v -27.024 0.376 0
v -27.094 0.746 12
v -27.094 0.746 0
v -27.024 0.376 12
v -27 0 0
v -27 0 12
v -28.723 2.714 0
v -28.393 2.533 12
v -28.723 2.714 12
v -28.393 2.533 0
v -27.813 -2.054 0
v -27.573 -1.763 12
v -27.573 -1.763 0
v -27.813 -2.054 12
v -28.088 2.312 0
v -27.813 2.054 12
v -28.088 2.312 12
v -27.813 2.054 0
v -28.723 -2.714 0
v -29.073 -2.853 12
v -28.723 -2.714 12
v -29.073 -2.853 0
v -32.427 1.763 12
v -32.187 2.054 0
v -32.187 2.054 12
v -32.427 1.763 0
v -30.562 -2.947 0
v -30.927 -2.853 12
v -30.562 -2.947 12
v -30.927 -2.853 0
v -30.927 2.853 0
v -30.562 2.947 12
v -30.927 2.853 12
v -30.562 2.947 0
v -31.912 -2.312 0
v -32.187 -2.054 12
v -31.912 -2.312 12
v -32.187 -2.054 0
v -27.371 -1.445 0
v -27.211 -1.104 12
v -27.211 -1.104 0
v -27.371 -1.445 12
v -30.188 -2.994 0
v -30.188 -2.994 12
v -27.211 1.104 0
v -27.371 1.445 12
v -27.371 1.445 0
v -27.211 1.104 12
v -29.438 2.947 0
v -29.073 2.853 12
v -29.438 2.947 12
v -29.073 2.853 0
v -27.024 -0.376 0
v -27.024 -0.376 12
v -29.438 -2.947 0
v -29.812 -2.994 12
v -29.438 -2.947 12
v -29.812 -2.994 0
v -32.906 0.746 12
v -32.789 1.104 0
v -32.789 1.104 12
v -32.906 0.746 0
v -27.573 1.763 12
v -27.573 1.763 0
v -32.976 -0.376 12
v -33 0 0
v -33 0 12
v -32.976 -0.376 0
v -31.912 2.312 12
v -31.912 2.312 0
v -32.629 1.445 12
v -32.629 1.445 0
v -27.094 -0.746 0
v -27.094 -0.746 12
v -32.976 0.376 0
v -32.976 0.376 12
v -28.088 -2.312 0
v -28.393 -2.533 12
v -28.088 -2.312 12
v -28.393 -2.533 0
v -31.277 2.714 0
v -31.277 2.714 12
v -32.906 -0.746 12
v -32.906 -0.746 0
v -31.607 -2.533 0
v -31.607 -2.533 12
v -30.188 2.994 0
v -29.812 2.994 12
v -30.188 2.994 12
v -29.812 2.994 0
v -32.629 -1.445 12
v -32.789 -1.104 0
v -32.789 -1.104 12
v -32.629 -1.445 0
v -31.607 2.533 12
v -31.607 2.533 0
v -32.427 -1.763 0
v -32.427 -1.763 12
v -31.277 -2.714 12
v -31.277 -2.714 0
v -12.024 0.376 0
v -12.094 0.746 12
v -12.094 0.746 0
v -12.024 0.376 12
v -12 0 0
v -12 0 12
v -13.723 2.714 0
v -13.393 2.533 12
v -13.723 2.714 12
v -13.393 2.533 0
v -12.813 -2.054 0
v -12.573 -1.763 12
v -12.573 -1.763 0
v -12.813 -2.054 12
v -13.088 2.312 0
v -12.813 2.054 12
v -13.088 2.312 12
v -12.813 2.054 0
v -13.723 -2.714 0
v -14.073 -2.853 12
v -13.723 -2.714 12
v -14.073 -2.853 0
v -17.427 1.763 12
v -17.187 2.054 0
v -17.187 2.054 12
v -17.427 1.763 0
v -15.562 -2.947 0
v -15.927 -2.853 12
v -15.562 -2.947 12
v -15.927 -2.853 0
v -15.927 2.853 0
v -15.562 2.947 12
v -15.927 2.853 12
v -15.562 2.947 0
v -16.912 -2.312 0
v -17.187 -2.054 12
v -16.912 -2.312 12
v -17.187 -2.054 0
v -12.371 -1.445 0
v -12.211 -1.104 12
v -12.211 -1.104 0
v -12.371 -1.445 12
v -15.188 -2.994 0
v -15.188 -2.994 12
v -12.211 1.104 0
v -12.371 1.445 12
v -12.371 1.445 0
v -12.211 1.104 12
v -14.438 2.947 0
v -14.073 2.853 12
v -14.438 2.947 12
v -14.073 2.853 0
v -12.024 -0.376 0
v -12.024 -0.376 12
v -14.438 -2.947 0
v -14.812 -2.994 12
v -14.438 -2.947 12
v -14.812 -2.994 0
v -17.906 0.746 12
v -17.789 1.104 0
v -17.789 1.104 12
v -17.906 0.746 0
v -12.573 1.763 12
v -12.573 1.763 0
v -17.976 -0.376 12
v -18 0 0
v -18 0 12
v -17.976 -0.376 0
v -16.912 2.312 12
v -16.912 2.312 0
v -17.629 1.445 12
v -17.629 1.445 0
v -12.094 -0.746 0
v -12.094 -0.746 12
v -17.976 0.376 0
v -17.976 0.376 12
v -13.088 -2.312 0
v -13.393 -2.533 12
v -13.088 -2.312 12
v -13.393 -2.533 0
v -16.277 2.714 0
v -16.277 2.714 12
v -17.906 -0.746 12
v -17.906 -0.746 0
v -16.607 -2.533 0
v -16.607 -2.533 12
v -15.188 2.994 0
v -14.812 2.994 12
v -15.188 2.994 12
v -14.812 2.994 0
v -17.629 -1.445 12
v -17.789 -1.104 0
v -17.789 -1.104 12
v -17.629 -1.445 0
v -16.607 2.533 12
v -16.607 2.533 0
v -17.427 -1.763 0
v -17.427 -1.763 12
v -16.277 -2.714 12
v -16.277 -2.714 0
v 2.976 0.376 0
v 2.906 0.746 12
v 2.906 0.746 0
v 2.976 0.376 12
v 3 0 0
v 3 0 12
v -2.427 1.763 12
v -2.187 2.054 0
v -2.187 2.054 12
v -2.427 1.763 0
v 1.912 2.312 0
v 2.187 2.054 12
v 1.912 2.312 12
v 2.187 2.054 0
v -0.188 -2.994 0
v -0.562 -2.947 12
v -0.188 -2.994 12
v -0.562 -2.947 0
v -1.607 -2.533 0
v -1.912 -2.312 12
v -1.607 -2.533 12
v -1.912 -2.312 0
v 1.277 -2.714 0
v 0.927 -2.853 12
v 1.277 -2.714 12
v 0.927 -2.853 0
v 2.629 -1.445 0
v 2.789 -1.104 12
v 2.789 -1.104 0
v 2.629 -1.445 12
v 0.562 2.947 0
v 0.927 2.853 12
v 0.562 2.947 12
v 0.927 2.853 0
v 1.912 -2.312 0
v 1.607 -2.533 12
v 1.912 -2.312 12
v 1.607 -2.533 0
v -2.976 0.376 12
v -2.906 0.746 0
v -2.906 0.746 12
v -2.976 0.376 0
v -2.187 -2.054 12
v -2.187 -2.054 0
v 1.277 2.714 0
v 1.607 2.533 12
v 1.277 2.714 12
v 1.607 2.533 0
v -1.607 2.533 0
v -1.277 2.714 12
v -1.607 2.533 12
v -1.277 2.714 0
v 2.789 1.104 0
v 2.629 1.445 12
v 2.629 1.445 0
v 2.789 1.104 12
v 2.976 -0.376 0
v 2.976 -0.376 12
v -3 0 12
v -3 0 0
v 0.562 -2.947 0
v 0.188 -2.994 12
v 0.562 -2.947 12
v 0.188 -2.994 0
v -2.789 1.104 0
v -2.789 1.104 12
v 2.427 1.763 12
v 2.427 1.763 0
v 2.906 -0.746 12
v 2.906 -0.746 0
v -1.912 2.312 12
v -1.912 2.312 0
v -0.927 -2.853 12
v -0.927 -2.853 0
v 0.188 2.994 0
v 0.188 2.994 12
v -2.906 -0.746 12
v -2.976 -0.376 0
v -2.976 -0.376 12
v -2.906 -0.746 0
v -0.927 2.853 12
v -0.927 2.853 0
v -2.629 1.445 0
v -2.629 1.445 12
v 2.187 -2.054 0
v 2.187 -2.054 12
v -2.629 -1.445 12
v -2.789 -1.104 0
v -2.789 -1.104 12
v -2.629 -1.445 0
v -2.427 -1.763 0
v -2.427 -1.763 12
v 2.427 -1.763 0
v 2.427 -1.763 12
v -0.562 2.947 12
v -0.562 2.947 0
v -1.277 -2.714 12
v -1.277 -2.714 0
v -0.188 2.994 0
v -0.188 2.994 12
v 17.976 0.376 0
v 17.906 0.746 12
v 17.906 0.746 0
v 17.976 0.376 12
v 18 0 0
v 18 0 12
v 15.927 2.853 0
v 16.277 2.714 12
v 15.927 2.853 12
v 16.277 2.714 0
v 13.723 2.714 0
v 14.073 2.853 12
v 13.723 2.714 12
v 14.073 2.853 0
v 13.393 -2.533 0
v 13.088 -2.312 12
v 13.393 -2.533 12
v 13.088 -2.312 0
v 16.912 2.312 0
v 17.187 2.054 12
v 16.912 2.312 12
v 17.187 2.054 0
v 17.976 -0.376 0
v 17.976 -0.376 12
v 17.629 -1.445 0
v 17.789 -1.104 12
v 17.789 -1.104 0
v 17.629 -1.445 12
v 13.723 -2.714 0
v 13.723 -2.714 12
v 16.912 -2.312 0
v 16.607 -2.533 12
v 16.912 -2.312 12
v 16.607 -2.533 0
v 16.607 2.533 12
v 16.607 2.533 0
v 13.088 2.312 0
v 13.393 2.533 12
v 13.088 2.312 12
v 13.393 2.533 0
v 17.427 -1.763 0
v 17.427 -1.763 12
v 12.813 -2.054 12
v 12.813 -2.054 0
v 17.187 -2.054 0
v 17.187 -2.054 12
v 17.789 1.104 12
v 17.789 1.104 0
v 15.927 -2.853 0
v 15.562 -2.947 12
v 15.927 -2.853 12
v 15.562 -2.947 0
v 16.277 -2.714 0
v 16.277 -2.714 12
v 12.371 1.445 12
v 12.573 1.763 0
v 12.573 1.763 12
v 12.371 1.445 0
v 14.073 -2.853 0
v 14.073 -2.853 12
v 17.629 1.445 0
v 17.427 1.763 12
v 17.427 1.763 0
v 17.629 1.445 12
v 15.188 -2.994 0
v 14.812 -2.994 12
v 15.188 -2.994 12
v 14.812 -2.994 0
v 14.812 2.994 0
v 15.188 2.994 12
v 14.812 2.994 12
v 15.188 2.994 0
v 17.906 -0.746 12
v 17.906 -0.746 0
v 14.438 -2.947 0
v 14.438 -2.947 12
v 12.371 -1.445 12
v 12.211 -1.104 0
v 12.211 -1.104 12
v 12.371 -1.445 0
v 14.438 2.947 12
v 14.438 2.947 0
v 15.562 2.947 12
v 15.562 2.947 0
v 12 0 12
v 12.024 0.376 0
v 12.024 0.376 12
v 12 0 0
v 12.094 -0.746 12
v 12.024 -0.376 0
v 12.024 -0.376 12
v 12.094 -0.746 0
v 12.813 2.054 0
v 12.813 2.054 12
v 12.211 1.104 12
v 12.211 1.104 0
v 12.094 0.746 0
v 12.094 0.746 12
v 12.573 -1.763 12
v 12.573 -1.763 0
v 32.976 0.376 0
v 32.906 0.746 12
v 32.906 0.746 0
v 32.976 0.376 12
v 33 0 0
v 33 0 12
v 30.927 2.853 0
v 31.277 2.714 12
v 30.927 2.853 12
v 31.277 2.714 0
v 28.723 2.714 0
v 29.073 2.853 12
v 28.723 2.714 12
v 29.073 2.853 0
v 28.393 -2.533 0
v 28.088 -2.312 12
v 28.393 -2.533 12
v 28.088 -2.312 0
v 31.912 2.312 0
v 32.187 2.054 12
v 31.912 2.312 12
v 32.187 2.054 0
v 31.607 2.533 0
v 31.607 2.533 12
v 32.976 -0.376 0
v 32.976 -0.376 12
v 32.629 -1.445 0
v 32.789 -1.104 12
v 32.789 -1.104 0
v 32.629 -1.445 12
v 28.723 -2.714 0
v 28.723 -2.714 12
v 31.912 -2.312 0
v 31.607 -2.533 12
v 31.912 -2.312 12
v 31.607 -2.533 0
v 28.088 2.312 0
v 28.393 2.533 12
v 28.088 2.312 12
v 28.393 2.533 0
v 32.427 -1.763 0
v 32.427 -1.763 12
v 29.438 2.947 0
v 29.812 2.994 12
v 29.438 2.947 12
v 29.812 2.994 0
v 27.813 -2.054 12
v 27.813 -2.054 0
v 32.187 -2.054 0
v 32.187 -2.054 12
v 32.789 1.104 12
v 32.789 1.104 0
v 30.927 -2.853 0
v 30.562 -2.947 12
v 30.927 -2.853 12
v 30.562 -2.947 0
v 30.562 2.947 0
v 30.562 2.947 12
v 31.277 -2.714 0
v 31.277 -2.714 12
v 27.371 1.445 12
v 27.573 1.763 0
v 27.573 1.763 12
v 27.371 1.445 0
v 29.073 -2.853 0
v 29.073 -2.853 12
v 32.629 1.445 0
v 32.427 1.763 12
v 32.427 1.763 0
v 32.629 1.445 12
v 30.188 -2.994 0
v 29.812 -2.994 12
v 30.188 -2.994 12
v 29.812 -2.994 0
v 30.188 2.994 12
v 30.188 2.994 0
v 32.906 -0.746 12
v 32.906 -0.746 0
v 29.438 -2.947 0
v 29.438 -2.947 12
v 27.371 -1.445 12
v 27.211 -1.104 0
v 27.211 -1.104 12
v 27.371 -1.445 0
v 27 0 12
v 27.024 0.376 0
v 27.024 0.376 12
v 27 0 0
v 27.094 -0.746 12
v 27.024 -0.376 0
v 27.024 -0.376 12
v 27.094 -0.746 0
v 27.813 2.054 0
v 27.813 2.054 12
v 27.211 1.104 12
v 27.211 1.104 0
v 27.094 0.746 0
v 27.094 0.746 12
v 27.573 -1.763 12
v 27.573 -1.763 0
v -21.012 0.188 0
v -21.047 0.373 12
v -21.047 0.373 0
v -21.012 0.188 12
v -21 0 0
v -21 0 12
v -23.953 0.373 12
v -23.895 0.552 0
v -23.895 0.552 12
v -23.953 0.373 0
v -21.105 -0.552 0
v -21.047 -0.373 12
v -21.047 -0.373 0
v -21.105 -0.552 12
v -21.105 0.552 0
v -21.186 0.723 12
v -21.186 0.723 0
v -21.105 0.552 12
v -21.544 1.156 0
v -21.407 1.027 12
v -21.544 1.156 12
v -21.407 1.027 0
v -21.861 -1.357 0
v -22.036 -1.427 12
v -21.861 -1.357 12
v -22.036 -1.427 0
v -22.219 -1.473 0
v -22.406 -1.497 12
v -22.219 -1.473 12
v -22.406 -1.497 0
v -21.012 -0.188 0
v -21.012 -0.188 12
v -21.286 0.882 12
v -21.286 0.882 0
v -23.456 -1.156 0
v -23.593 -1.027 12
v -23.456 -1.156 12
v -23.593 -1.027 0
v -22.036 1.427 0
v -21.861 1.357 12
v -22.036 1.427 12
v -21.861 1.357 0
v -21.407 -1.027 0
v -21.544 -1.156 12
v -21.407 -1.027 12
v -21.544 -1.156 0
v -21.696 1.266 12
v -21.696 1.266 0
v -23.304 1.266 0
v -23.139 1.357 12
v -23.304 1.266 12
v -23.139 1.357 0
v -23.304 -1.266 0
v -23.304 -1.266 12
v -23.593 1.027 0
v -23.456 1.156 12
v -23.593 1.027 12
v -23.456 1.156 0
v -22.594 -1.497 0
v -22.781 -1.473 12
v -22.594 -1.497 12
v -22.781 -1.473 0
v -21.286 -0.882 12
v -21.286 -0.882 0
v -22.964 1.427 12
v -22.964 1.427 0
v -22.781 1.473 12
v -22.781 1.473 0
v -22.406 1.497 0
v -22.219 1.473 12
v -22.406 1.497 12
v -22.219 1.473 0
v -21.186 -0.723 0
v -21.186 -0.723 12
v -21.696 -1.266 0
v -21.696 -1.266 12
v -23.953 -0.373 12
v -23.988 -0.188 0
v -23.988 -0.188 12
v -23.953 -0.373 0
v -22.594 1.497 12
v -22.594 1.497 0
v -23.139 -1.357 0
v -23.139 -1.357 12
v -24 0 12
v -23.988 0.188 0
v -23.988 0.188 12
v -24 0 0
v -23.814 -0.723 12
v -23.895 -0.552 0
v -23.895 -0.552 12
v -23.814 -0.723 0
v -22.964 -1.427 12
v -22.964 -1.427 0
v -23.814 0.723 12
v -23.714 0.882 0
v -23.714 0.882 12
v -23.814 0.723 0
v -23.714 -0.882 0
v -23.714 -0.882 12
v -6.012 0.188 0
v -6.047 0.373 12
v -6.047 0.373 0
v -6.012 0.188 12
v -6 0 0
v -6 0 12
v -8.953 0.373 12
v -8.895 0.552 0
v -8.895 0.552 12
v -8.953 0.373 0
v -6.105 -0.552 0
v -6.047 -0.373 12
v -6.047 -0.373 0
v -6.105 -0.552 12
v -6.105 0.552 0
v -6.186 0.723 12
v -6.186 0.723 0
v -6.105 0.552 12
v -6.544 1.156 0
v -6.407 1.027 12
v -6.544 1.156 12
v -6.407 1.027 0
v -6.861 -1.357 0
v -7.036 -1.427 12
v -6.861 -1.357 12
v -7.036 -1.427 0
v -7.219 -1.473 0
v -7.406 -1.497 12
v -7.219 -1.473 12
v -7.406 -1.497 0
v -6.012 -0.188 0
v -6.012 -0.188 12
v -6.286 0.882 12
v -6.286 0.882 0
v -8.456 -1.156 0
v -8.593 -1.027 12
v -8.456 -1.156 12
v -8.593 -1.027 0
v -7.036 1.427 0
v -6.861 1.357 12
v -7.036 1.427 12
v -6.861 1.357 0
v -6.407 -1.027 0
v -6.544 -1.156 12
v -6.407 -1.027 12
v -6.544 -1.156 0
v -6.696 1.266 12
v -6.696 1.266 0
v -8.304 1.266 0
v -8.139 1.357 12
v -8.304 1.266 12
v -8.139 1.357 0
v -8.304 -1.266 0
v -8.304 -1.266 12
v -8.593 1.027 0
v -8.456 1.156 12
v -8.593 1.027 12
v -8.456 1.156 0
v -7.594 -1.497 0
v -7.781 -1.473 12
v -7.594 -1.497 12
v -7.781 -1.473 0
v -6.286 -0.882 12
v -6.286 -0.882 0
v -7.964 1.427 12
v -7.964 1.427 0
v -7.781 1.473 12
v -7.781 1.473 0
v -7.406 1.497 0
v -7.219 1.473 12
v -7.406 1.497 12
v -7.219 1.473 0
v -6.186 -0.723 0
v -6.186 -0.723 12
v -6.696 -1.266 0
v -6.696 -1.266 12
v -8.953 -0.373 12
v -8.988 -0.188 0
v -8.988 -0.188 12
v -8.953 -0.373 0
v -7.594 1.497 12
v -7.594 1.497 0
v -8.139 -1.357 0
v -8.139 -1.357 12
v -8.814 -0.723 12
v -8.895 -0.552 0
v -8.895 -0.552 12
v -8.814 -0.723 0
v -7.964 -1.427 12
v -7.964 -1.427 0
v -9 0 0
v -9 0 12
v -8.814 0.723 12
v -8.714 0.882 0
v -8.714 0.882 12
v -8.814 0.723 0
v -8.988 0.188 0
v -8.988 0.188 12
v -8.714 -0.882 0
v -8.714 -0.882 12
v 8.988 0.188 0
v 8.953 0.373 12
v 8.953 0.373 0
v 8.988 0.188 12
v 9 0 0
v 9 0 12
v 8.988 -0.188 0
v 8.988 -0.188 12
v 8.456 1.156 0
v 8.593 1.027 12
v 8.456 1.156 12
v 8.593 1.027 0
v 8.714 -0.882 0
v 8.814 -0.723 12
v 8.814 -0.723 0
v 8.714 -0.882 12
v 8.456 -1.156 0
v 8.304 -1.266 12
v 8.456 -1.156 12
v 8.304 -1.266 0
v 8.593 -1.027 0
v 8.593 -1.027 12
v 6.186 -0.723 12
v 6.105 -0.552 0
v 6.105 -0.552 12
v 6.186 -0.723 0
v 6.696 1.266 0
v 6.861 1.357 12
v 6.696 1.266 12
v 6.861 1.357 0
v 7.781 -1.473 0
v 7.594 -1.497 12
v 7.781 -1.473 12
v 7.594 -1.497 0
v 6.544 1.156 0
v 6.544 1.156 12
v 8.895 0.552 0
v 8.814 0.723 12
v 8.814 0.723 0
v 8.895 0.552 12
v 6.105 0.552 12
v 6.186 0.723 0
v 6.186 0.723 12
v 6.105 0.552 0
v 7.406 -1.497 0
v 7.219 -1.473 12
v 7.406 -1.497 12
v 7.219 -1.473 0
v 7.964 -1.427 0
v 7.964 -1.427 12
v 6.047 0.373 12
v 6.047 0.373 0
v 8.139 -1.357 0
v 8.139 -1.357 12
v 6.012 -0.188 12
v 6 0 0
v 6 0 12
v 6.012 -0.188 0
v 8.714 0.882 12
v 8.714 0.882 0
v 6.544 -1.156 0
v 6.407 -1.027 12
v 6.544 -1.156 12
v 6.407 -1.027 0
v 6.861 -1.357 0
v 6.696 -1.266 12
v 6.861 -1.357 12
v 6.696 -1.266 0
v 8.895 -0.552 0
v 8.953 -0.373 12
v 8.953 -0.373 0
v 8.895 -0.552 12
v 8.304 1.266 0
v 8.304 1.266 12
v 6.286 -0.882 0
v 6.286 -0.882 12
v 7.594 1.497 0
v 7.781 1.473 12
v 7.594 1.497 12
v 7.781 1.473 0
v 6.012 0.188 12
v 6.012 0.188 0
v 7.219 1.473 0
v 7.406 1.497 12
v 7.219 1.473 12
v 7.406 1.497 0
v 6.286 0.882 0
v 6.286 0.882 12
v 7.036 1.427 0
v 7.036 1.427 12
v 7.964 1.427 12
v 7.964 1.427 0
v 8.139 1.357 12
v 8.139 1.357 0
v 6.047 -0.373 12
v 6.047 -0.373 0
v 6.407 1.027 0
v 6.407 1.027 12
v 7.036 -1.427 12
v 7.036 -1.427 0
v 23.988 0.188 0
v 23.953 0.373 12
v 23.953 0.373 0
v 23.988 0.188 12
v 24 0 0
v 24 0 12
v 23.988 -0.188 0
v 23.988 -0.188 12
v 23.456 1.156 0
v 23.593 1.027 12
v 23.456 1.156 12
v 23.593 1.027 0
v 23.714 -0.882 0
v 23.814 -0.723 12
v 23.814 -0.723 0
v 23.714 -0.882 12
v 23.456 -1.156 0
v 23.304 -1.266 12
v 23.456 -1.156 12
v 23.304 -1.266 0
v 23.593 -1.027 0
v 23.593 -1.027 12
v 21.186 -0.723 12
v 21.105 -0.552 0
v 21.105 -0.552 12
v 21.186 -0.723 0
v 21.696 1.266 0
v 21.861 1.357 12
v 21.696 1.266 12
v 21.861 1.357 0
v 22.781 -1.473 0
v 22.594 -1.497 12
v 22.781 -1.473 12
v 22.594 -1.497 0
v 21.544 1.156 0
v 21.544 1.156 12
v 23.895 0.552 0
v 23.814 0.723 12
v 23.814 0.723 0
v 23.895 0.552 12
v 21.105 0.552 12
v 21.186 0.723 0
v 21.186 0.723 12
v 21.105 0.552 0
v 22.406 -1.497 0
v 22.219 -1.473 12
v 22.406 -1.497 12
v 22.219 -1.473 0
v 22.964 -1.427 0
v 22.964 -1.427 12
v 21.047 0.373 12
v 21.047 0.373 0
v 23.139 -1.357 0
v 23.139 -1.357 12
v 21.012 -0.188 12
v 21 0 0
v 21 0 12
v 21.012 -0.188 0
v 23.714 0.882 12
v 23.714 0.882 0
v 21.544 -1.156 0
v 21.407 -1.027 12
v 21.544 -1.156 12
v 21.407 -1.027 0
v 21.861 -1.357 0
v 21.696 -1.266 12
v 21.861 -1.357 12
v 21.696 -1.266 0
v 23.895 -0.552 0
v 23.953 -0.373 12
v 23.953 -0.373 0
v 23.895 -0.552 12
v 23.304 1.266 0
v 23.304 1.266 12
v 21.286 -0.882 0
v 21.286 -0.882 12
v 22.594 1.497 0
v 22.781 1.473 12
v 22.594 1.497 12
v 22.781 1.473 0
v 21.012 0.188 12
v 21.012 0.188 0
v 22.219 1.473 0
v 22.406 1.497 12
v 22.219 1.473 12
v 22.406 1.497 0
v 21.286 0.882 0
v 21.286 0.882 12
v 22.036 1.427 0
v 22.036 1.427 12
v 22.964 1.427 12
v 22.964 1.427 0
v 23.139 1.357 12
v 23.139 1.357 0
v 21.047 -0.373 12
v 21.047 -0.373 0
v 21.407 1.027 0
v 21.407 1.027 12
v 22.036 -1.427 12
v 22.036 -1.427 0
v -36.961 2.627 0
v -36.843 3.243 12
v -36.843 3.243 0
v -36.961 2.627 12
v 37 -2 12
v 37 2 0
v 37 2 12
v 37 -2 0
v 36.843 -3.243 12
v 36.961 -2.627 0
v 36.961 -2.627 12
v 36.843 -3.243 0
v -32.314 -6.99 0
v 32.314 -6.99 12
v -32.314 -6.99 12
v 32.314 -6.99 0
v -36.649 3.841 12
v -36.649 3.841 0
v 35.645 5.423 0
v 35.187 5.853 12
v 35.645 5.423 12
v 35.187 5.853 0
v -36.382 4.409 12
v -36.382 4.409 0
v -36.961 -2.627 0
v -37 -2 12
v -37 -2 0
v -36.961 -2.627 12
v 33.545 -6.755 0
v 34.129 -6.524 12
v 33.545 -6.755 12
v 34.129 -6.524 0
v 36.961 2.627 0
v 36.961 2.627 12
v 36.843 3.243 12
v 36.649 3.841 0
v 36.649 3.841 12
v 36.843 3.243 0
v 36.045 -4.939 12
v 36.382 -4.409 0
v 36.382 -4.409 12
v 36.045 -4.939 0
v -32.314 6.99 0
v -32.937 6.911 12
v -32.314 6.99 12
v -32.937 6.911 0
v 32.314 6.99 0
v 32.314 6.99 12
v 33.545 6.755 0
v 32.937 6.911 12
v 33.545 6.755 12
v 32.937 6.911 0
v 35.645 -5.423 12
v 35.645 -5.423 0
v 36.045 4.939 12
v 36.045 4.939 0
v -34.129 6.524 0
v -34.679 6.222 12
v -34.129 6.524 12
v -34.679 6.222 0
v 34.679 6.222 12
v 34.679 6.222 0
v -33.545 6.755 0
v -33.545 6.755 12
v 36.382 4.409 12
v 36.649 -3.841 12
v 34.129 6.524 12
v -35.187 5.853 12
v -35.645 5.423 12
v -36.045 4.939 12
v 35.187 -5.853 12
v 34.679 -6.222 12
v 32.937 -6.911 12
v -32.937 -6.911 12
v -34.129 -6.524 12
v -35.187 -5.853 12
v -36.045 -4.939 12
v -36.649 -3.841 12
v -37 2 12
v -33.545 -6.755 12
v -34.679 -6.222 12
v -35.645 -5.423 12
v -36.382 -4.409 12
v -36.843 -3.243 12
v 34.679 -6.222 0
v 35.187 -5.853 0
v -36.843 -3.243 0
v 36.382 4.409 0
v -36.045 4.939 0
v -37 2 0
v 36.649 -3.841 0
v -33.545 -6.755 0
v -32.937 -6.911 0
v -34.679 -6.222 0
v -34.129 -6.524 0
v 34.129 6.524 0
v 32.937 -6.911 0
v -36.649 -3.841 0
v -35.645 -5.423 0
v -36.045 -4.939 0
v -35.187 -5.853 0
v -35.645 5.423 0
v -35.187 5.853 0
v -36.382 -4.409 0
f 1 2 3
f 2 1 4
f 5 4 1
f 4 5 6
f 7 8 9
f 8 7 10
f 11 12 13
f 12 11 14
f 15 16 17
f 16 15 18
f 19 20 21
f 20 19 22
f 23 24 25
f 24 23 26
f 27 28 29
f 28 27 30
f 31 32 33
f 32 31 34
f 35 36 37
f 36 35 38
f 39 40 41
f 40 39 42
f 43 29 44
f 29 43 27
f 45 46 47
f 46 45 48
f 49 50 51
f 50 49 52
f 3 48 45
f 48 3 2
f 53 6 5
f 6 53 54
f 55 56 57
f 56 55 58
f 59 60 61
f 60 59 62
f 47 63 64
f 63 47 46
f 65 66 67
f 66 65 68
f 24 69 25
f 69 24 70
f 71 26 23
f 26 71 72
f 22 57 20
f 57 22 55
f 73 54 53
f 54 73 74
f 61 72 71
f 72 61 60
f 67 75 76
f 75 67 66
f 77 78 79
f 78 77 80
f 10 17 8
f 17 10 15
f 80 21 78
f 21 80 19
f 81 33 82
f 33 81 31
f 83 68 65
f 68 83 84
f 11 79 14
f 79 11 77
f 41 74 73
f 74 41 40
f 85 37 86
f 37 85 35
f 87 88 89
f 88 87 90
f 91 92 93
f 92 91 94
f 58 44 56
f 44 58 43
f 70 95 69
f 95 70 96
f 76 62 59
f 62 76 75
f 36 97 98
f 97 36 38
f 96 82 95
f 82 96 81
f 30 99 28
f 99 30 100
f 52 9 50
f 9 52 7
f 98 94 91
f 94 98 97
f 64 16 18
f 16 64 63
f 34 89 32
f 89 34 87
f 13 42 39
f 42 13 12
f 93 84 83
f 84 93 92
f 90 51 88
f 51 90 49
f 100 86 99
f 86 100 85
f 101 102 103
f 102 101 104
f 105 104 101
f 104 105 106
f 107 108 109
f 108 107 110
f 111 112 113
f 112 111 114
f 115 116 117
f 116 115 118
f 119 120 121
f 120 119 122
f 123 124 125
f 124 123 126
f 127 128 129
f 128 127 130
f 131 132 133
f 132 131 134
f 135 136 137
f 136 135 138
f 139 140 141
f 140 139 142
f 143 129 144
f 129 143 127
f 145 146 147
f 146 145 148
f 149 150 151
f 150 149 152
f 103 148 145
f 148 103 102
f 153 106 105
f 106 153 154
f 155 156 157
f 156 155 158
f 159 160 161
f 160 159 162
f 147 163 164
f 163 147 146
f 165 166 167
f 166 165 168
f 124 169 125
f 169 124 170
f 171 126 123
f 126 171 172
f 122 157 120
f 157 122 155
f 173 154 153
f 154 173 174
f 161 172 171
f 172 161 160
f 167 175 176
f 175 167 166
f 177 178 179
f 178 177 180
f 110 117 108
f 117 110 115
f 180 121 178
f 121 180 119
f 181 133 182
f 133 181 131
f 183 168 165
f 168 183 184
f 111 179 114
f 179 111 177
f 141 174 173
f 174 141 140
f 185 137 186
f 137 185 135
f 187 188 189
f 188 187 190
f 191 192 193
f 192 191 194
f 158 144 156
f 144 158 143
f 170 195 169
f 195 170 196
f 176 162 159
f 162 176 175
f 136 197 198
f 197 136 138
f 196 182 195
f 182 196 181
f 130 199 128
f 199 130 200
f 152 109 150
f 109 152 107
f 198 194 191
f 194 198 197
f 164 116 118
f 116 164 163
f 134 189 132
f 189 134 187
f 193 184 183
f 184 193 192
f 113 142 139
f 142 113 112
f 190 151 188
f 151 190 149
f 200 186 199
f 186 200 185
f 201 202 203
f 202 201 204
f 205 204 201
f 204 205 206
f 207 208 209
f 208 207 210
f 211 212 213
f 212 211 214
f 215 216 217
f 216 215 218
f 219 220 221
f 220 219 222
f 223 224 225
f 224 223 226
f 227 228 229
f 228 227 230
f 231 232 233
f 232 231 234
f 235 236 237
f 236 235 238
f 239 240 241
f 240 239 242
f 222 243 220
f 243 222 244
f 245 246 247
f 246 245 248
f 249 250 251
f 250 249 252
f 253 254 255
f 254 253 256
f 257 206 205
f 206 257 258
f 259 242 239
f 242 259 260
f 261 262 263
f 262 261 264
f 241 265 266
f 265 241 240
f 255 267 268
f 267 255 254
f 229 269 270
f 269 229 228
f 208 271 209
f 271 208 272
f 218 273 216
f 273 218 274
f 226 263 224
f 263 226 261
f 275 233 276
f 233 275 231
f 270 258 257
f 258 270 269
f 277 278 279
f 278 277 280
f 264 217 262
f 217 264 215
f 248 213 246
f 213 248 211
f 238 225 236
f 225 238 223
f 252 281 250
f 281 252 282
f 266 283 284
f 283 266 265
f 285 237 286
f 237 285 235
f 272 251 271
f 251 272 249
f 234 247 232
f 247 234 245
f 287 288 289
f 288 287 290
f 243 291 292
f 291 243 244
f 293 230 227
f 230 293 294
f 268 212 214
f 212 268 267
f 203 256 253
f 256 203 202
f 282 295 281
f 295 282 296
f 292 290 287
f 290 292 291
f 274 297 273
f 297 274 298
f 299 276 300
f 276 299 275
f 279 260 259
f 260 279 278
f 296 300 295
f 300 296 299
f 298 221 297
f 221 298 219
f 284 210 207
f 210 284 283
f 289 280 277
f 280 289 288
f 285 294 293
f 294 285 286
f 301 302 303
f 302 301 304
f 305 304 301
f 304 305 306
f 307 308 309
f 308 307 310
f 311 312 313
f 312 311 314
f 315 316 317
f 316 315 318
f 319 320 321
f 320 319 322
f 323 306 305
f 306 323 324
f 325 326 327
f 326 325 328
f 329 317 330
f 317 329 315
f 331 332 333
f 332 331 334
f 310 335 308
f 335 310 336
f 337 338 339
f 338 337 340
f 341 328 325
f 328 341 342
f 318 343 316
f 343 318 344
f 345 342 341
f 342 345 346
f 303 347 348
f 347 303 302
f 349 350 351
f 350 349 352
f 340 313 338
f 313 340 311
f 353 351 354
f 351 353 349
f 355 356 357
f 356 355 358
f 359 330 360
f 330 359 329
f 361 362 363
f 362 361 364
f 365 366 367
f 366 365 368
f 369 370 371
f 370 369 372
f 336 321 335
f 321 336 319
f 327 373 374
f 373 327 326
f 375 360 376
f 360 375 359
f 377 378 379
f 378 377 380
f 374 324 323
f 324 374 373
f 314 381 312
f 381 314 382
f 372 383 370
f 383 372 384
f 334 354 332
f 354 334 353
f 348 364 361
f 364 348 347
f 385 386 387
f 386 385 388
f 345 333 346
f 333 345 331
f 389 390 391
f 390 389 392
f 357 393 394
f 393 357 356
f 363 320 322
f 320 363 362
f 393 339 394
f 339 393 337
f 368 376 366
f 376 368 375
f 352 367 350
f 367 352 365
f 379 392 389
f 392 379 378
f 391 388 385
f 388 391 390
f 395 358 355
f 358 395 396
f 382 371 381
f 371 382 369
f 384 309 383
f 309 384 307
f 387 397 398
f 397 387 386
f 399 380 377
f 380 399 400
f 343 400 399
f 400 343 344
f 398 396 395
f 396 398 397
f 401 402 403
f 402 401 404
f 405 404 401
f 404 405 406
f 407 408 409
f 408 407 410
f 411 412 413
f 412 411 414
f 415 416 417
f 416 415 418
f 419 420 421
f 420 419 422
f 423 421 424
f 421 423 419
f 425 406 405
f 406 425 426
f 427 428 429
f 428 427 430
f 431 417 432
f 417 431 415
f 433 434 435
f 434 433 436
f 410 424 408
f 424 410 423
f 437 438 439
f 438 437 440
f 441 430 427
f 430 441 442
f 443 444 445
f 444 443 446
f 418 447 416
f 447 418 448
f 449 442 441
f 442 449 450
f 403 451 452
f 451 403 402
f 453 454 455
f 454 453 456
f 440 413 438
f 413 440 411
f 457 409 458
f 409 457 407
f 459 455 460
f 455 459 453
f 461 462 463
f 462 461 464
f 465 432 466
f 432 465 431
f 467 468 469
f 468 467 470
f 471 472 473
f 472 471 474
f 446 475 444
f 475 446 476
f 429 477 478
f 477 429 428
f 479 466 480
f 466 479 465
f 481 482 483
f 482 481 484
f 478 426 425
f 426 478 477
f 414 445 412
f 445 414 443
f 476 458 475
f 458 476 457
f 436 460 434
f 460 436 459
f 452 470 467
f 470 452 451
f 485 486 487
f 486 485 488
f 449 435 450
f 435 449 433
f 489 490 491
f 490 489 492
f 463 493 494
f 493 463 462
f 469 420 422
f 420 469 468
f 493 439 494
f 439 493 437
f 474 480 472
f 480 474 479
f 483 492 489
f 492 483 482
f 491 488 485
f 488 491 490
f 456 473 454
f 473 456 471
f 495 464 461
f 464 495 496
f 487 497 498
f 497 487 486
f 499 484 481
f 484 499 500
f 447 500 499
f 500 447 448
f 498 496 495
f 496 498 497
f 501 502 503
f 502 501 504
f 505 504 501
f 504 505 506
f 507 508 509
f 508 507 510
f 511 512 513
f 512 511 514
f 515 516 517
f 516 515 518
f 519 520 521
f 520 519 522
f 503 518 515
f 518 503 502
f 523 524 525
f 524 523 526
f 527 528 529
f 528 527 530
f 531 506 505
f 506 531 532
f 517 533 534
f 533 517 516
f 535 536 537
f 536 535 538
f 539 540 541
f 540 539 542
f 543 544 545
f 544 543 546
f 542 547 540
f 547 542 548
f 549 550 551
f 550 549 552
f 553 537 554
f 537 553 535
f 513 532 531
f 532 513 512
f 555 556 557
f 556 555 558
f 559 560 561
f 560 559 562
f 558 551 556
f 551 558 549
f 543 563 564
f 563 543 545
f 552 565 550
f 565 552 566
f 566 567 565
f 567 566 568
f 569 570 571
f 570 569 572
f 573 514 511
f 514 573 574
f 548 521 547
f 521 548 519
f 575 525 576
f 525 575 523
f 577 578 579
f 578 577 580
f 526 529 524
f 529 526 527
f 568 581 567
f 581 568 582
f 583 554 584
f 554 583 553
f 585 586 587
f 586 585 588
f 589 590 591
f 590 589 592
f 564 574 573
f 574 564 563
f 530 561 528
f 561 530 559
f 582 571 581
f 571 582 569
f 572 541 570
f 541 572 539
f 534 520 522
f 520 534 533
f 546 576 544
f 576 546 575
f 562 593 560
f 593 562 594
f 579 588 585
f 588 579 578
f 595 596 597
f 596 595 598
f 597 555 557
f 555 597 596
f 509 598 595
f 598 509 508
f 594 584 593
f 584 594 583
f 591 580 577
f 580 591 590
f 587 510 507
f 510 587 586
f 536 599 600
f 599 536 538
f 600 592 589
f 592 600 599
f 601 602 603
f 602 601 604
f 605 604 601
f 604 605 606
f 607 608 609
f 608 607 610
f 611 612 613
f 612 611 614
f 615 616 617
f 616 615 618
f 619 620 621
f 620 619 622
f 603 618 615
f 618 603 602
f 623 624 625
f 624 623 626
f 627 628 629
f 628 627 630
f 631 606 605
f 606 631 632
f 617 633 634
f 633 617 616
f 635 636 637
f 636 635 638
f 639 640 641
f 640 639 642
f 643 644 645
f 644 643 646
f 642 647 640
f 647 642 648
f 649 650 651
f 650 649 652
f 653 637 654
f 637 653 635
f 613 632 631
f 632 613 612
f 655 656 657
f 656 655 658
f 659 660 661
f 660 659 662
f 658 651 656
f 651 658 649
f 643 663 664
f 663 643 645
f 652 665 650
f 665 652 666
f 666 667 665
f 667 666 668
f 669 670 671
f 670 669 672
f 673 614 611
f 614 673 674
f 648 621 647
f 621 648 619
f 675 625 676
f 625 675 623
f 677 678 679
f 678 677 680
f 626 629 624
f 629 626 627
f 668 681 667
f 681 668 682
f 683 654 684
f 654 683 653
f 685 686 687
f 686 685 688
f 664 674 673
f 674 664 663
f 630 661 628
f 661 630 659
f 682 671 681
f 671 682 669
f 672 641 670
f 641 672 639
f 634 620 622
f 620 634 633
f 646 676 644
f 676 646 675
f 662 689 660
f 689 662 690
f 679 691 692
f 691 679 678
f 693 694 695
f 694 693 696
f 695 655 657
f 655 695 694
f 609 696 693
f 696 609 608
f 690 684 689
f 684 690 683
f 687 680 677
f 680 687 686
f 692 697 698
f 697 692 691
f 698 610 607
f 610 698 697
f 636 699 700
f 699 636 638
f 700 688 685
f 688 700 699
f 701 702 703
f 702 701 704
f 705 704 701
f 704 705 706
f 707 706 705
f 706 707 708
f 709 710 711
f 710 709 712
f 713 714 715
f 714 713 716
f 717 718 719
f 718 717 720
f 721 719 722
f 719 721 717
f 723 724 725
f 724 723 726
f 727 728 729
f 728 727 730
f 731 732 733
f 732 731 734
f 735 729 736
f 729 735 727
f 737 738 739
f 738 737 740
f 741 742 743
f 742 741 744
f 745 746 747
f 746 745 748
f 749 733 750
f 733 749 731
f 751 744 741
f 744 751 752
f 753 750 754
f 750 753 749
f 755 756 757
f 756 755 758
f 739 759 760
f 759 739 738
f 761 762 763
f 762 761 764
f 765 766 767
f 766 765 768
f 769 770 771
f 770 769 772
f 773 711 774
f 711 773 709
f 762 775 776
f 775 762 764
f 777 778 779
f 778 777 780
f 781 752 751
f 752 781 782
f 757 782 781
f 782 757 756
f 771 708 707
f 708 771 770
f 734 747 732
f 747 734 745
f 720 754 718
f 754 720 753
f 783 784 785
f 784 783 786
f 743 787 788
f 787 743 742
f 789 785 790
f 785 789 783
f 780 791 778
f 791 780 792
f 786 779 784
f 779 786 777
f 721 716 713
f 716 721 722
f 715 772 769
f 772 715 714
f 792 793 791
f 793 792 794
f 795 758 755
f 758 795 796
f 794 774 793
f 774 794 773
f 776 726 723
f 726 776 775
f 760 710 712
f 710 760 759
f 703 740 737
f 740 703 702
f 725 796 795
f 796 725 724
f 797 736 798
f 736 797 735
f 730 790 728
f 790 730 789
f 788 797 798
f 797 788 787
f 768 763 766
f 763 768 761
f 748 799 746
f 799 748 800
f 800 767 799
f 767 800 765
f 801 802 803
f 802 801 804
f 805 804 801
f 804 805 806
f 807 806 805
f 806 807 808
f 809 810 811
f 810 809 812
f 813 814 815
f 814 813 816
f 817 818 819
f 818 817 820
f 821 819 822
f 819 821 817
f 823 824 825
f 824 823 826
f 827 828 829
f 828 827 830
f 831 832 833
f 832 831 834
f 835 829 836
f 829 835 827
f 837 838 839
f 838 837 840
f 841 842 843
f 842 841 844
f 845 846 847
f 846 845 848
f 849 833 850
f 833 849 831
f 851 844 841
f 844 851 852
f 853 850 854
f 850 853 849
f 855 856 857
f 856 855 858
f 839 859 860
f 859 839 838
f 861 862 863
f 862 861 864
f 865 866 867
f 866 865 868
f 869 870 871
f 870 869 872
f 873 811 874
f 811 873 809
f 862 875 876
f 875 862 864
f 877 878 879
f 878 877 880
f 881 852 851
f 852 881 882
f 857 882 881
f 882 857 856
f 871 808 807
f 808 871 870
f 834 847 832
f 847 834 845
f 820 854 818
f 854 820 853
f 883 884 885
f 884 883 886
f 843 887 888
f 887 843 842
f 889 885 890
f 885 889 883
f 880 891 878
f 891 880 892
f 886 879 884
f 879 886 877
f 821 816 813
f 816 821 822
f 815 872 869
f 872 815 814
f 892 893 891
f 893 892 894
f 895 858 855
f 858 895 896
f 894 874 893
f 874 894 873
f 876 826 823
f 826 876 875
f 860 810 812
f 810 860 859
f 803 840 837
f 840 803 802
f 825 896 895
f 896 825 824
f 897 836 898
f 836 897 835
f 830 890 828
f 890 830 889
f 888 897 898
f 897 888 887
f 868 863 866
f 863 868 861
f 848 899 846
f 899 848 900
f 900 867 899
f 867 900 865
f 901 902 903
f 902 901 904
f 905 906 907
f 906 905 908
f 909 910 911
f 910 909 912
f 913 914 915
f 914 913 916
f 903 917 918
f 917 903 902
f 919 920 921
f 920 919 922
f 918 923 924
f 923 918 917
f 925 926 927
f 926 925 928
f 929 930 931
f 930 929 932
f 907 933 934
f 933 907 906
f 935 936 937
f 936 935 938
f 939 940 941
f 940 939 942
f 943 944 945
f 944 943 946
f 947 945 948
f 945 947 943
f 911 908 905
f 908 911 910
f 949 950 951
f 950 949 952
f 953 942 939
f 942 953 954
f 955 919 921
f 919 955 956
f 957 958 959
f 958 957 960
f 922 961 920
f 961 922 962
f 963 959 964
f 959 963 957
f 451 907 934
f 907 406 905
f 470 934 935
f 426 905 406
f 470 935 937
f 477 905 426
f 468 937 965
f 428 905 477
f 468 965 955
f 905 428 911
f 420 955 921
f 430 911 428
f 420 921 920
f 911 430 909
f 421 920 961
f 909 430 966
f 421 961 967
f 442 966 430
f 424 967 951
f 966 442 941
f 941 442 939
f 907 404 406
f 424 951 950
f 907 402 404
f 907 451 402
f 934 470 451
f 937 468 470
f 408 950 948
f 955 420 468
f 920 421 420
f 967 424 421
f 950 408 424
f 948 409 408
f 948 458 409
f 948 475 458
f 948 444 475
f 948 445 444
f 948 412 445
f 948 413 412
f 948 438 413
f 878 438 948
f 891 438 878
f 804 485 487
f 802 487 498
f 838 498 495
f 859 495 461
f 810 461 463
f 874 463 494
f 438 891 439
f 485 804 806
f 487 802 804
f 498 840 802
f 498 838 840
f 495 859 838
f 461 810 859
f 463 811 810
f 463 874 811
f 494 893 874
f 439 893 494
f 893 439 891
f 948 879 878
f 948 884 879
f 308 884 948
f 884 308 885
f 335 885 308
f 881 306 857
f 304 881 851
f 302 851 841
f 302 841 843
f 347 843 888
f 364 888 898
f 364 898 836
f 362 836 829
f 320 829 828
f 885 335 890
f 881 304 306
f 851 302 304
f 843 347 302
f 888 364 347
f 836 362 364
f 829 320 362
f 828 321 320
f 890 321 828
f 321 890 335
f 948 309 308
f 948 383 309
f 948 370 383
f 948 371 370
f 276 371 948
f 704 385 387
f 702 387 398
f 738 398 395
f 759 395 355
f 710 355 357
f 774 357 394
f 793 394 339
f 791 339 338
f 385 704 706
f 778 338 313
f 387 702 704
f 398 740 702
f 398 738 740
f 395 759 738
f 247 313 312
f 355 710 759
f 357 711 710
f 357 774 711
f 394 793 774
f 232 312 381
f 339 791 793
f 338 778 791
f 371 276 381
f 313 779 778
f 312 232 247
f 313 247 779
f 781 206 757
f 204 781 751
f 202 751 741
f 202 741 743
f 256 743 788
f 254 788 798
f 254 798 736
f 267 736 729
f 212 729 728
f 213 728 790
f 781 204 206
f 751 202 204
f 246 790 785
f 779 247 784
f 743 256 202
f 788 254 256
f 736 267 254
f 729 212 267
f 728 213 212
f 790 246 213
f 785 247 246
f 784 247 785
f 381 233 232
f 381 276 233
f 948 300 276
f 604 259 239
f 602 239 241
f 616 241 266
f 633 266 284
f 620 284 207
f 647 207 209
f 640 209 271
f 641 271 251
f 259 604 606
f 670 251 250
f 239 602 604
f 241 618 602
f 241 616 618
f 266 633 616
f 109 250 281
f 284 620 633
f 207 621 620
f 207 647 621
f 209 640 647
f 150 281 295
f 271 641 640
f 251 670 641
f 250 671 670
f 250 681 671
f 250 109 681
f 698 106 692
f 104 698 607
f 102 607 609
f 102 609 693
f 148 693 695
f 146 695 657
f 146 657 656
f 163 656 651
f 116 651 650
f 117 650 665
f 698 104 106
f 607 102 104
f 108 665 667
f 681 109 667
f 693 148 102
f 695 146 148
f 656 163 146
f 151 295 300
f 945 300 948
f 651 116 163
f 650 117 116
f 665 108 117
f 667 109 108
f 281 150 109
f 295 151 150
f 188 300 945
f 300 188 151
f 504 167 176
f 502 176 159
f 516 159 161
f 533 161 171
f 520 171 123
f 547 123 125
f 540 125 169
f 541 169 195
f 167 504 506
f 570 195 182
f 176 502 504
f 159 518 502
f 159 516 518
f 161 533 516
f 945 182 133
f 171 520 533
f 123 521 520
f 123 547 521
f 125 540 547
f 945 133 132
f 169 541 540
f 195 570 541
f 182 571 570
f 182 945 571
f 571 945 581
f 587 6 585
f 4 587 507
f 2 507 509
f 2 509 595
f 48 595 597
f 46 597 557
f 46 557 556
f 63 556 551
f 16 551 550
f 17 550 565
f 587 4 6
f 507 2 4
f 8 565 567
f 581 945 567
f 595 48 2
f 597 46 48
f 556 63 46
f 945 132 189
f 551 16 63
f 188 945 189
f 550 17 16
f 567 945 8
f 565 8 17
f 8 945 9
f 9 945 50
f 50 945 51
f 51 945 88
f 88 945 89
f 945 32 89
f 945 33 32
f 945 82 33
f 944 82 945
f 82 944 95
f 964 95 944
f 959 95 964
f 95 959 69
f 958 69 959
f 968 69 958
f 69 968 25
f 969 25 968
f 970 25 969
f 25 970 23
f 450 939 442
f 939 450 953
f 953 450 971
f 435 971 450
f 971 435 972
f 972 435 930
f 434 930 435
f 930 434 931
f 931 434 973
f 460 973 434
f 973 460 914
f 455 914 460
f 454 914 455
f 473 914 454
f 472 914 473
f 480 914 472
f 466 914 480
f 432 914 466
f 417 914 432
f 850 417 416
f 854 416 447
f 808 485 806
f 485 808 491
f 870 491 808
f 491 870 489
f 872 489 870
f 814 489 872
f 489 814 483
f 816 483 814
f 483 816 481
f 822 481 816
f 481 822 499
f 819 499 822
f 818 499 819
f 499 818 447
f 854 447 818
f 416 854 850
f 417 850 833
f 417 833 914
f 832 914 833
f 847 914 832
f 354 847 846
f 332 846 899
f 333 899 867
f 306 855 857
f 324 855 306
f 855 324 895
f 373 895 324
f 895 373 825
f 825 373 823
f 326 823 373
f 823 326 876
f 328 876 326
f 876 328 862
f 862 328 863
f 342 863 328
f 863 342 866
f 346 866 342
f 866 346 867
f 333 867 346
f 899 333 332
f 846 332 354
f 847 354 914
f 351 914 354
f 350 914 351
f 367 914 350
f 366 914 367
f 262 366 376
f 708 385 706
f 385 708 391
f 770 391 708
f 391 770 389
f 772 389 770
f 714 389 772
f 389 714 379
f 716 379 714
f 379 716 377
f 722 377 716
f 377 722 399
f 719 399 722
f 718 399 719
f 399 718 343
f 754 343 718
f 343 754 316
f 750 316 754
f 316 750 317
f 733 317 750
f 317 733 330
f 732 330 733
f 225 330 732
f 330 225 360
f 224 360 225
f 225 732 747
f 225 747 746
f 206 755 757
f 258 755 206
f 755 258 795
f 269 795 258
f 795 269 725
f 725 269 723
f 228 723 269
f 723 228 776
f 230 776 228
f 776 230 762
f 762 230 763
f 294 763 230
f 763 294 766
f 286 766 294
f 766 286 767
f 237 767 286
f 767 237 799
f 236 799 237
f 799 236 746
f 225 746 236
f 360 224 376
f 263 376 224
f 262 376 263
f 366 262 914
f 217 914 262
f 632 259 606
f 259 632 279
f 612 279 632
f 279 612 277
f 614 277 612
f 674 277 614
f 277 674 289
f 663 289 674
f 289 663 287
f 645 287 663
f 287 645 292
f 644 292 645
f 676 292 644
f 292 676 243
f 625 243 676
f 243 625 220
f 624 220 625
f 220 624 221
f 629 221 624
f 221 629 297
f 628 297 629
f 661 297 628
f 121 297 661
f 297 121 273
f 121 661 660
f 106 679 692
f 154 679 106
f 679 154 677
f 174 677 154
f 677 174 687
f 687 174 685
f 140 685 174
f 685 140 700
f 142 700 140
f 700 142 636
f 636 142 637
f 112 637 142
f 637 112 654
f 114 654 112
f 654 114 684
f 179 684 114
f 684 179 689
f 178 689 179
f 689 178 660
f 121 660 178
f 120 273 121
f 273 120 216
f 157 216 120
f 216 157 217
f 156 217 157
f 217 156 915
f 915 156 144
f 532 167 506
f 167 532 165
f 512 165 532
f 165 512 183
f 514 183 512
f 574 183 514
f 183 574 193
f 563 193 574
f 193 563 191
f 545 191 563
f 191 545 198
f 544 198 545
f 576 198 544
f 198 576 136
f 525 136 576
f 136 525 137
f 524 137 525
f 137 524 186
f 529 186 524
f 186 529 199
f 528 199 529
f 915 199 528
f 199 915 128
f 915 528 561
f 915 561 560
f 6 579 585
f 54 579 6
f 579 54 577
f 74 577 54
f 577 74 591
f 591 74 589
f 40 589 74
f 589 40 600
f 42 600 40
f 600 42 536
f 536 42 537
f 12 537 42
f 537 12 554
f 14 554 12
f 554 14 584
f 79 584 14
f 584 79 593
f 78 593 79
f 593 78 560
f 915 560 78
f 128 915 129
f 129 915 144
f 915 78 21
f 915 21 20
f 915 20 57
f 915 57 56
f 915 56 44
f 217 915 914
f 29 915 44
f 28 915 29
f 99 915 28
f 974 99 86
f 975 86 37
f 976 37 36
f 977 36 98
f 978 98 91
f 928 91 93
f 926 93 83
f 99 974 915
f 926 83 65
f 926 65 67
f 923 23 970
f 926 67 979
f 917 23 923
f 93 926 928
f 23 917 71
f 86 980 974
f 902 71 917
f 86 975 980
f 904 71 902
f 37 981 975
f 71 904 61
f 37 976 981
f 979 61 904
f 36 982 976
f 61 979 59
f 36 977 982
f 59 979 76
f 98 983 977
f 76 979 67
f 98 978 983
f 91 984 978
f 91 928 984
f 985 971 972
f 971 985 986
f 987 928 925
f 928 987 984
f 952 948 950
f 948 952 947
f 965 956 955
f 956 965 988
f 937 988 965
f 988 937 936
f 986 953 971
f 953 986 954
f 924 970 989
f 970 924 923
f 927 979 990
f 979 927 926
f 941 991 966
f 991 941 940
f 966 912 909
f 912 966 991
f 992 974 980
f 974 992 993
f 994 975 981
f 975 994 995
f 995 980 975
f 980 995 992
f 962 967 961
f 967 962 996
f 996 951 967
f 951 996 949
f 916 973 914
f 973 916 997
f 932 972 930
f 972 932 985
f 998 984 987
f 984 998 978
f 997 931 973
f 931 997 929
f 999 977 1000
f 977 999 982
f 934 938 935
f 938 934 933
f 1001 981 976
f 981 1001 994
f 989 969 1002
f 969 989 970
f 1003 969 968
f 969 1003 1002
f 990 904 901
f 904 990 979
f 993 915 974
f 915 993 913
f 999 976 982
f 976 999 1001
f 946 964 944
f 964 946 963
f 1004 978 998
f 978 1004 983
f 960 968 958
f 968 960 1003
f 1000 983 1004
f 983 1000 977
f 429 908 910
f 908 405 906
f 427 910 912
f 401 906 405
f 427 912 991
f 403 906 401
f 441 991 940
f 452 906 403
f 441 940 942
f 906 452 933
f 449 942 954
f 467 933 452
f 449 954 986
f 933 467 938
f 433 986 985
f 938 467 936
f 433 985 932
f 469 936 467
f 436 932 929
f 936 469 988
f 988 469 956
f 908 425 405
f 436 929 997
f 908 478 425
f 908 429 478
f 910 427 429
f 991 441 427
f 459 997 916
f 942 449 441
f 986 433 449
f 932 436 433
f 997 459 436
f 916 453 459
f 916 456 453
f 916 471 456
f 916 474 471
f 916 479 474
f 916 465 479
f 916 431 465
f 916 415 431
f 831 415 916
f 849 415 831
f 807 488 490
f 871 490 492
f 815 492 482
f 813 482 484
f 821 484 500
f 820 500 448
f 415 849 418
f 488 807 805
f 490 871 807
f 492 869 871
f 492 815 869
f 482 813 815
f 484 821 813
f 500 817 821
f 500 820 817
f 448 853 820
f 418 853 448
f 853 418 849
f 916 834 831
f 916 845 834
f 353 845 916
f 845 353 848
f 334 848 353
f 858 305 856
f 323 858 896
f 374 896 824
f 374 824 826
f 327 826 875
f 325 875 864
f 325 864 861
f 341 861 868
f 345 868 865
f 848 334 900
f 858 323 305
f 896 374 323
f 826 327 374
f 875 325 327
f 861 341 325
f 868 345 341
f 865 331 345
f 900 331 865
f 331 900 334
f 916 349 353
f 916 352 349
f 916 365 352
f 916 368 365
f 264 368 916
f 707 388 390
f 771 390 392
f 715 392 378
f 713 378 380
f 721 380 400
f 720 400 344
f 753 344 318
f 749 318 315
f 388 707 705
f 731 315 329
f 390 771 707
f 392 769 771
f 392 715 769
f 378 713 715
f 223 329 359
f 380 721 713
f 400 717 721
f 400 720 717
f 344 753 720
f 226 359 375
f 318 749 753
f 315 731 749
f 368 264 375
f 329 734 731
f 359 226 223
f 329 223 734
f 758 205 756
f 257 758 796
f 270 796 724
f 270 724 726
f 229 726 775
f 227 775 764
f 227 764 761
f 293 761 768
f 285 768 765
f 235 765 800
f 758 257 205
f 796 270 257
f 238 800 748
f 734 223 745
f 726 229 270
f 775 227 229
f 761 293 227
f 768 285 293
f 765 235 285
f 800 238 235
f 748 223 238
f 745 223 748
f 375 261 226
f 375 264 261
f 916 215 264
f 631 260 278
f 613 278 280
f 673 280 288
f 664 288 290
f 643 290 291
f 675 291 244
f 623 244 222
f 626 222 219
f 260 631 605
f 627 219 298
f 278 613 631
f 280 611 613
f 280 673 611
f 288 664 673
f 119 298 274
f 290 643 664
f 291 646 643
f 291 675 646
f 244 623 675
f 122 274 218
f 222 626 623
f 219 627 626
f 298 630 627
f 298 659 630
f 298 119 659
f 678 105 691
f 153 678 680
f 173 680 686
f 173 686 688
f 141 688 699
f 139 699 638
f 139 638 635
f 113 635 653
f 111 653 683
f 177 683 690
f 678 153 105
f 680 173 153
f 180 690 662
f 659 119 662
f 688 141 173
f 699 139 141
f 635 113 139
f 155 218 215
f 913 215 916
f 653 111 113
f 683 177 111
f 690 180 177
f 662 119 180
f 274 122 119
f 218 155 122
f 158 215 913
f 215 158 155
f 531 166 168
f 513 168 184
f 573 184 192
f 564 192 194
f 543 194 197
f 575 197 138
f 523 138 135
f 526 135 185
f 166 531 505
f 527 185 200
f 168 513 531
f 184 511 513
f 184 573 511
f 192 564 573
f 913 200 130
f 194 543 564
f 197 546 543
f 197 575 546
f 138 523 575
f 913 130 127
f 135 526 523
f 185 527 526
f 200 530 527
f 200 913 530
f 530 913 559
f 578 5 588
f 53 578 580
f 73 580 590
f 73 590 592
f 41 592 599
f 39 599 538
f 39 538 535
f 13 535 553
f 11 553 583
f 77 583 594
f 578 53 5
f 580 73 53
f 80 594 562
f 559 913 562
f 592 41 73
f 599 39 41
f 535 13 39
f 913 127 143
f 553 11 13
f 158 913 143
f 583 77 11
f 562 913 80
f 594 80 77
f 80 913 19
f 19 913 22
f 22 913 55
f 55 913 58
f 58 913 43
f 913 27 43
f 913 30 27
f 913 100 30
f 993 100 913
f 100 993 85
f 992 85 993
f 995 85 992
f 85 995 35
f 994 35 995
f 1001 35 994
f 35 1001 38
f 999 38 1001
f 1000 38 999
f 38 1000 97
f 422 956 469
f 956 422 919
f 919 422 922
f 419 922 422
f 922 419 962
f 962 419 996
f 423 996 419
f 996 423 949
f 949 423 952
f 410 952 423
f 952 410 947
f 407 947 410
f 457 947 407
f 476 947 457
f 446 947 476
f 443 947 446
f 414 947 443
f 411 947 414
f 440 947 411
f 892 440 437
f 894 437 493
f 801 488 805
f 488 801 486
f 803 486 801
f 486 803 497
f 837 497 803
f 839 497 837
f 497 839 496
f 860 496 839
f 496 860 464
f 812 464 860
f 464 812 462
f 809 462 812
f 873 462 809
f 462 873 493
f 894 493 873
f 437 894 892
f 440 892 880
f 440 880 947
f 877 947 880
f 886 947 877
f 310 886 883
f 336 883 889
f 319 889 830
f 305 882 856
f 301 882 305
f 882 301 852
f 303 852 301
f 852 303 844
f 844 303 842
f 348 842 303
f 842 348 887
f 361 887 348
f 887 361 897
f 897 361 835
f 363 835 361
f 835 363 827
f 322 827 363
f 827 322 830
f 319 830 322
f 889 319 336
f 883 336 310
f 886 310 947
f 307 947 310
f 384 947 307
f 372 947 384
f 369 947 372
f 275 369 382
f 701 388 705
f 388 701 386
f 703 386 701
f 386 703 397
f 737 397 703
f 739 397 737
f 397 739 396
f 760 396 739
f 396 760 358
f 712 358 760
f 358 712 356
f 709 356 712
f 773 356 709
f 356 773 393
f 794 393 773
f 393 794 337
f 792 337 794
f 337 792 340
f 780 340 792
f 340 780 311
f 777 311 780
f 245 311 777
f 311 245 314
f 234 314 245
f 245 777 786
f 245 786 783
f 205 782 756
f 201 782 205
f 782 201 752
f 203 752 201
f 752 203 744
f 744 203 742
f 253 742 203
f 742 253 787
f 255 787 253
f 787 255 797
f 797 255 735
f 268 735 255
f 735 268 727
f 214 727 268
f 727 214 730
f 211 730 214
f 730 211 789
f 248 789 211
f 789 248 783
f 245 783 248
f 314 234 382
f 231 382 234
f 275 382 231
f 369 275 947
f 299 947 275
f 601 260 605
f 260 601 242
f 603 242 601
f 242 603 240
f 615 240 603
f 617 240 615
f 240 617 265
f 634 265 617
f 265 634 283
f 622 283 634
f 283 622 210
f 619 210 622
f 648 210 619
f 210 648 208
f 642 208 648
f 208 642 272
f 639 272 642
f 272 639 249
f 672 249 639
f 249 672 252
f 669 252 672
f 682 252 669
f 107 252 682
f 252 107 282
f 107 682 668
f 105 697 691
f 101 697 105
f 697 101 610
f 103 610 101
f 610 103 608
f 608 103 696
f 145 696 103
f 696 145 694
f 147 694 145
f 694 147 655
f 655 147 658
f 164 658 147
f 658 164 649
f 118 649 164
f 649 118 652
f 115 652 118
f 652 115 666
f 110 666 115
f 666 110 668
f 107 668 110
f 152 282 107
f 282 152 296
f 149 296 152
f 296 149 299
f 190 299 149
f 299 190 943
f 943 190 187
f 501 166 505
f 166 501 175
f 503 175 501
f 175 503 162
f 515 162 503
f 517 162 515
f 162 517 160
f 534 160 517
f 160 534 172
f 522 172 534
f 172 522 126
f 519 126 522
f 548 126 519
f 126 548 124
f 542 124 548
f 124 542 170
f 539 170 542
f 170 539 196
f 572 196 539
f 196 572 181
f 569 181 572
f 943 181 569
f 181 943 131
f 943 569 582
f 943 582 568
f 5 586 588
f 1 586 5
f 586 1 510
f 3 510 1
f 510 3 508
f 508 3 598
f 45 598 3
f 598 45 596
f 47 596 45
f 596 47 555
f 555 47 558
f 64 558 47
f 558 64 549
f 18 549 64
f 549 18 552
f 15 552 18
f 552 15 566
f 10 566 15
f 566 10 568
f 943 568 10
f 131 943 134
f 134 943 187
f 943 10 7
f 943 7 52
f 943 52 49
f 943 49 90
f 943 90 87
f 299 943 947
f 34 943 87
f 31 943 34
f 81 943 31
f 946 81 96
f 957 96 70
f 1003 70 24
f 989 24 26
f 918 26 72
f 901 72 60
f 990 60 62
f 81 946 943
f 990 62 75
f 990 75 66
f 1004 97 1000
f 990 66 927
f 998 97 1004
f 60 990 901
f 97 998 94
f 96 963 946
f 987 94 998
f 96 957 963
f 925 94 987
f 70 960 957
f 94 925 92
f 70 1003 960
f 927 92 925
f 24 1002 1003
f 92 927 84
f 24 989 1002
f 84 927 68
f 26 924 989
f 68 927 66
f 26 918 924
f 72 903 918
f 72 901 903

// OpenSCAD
$fn = 50;


difference() {
	union() {
		*color(alpha = 1.0000000000, c = "gray") {
			translate(v = [0, 7, 0]) {
				linear_extrude(height = 1) {
					text(font = "Arial:style=Bold", halign = "center", size = 4.5000000000, text = "COMMENT plate main", valign = "center");
				}
			}
		}
		hull() {
			translate(v = [-32.0000000000, 2.0000000000, 0]) {
				cylinder(h = 12, r = 5);
			}
			translate(v = [32.0000000000, 2.0000000000, 0]) {
				cylinder(h = 12, r = 5);
			}
			translate(v = [-32.0000000000, -2.0000000000, 0]) {
				cylinder(h = 12, r = 5);
			}
			translate(v = [32.0000000000, -2.0000000000, 0]) {
				cylinder(h = 12, r = 5);
			}
		}
	}
	union() {
		*color(alpha = 1.0000000000, c = "gray") {
			translate(v = [0, 7, 0]) {
				linear_extrude(height = 1) {
					text(font = "Arial:style=Bold", halign = "center", size = 4.5000000000, text = "COMMENT holes main", valign = "center");
				}
			}
		}
		translate(v = [-30.0000000000, 0.0000000000, 0]) {
			translate(v = [0, 0, -100]) {
				cylinder(h = 200, r = 3.0000000000);
			}
		}
		translate(v = [-15.0000000000, 0.0000000000, 0]) {
			translate(v = [0, 0, -100]) {
				cylinder(h = 200, r = 3.0000000000);
			}
		}
		translate(v = [0, 0, -100]) {
			cylinder(h = 200, r = 3.0000000000);
		}
		translate(v = [15.0000000000, 0.0000000000, 0]) {
			translate(v = [0, 0, -100]) {
				cylinder(h = 200, r = 3.0000000000);
			}
		}
		translate(v = [30.0000000000, 0.0000000000, 0]) {
			translate(v = [0, 0, -100]) {
				cylinder(h = 200, r = 3.0000000000);
			}
		}
		translate(v = [-30.0000000000, 0.0000000000, 0]) {
			translate(v = [0, 0, -100]) {
				cylinder(h = 200, r = 1.5000000000);
			}
		}
		translate(v = [-22.5000000000, 0.0000000000, 0]) {
			translate(v = [0, 0, -100]) {
				cylinder(h = 200, r = 1.5000000000);
			}
		}
		translate(v = [-15.0000000000, 0.0000000000, 0]) {
			translate(v = [0, 0, -100]) {
				cylinder(h = 200, r = 1.5000000000);
			}
		}
		translate(v = [-7.5000000000, 0.0000000000, 0]) {
			translate(v = [0, 0, -100]) {
				cylinder(h = 200, r = 1.5000000000);
			}
		}
		translate(v = [0, 0, -100]) {
			cylinder(h = 200, r = 1.5000000000);
		}
		translate(v = [7.5000000000, 0.0000000000, 0]) {
			translate(v = [0, 0, -100]) {
				cylinder(h = 200, r = 1.5000000000);
			}
		}
		translate(v = [15.0000000000, 0.0000000000, 0]) {
			translate(v = [0, 0, -100]) {
				cylinder(h = 200, r = 1.5000000000);
			}
		}
		translate(v = [22.5000000000, 0.0000000000, 0]) {
			translate(v = [0, 0, -100]) {
				cylinder(h = 200, r = 1.5000000000);
			}
		}
		translate(v = [30.0000000000, 0.0000000000, 0]) {
			translate(v = [0, 0, -100]) {
				cylinder(h = 200, r = 1.5000000000);
			}
		}
	}
}
